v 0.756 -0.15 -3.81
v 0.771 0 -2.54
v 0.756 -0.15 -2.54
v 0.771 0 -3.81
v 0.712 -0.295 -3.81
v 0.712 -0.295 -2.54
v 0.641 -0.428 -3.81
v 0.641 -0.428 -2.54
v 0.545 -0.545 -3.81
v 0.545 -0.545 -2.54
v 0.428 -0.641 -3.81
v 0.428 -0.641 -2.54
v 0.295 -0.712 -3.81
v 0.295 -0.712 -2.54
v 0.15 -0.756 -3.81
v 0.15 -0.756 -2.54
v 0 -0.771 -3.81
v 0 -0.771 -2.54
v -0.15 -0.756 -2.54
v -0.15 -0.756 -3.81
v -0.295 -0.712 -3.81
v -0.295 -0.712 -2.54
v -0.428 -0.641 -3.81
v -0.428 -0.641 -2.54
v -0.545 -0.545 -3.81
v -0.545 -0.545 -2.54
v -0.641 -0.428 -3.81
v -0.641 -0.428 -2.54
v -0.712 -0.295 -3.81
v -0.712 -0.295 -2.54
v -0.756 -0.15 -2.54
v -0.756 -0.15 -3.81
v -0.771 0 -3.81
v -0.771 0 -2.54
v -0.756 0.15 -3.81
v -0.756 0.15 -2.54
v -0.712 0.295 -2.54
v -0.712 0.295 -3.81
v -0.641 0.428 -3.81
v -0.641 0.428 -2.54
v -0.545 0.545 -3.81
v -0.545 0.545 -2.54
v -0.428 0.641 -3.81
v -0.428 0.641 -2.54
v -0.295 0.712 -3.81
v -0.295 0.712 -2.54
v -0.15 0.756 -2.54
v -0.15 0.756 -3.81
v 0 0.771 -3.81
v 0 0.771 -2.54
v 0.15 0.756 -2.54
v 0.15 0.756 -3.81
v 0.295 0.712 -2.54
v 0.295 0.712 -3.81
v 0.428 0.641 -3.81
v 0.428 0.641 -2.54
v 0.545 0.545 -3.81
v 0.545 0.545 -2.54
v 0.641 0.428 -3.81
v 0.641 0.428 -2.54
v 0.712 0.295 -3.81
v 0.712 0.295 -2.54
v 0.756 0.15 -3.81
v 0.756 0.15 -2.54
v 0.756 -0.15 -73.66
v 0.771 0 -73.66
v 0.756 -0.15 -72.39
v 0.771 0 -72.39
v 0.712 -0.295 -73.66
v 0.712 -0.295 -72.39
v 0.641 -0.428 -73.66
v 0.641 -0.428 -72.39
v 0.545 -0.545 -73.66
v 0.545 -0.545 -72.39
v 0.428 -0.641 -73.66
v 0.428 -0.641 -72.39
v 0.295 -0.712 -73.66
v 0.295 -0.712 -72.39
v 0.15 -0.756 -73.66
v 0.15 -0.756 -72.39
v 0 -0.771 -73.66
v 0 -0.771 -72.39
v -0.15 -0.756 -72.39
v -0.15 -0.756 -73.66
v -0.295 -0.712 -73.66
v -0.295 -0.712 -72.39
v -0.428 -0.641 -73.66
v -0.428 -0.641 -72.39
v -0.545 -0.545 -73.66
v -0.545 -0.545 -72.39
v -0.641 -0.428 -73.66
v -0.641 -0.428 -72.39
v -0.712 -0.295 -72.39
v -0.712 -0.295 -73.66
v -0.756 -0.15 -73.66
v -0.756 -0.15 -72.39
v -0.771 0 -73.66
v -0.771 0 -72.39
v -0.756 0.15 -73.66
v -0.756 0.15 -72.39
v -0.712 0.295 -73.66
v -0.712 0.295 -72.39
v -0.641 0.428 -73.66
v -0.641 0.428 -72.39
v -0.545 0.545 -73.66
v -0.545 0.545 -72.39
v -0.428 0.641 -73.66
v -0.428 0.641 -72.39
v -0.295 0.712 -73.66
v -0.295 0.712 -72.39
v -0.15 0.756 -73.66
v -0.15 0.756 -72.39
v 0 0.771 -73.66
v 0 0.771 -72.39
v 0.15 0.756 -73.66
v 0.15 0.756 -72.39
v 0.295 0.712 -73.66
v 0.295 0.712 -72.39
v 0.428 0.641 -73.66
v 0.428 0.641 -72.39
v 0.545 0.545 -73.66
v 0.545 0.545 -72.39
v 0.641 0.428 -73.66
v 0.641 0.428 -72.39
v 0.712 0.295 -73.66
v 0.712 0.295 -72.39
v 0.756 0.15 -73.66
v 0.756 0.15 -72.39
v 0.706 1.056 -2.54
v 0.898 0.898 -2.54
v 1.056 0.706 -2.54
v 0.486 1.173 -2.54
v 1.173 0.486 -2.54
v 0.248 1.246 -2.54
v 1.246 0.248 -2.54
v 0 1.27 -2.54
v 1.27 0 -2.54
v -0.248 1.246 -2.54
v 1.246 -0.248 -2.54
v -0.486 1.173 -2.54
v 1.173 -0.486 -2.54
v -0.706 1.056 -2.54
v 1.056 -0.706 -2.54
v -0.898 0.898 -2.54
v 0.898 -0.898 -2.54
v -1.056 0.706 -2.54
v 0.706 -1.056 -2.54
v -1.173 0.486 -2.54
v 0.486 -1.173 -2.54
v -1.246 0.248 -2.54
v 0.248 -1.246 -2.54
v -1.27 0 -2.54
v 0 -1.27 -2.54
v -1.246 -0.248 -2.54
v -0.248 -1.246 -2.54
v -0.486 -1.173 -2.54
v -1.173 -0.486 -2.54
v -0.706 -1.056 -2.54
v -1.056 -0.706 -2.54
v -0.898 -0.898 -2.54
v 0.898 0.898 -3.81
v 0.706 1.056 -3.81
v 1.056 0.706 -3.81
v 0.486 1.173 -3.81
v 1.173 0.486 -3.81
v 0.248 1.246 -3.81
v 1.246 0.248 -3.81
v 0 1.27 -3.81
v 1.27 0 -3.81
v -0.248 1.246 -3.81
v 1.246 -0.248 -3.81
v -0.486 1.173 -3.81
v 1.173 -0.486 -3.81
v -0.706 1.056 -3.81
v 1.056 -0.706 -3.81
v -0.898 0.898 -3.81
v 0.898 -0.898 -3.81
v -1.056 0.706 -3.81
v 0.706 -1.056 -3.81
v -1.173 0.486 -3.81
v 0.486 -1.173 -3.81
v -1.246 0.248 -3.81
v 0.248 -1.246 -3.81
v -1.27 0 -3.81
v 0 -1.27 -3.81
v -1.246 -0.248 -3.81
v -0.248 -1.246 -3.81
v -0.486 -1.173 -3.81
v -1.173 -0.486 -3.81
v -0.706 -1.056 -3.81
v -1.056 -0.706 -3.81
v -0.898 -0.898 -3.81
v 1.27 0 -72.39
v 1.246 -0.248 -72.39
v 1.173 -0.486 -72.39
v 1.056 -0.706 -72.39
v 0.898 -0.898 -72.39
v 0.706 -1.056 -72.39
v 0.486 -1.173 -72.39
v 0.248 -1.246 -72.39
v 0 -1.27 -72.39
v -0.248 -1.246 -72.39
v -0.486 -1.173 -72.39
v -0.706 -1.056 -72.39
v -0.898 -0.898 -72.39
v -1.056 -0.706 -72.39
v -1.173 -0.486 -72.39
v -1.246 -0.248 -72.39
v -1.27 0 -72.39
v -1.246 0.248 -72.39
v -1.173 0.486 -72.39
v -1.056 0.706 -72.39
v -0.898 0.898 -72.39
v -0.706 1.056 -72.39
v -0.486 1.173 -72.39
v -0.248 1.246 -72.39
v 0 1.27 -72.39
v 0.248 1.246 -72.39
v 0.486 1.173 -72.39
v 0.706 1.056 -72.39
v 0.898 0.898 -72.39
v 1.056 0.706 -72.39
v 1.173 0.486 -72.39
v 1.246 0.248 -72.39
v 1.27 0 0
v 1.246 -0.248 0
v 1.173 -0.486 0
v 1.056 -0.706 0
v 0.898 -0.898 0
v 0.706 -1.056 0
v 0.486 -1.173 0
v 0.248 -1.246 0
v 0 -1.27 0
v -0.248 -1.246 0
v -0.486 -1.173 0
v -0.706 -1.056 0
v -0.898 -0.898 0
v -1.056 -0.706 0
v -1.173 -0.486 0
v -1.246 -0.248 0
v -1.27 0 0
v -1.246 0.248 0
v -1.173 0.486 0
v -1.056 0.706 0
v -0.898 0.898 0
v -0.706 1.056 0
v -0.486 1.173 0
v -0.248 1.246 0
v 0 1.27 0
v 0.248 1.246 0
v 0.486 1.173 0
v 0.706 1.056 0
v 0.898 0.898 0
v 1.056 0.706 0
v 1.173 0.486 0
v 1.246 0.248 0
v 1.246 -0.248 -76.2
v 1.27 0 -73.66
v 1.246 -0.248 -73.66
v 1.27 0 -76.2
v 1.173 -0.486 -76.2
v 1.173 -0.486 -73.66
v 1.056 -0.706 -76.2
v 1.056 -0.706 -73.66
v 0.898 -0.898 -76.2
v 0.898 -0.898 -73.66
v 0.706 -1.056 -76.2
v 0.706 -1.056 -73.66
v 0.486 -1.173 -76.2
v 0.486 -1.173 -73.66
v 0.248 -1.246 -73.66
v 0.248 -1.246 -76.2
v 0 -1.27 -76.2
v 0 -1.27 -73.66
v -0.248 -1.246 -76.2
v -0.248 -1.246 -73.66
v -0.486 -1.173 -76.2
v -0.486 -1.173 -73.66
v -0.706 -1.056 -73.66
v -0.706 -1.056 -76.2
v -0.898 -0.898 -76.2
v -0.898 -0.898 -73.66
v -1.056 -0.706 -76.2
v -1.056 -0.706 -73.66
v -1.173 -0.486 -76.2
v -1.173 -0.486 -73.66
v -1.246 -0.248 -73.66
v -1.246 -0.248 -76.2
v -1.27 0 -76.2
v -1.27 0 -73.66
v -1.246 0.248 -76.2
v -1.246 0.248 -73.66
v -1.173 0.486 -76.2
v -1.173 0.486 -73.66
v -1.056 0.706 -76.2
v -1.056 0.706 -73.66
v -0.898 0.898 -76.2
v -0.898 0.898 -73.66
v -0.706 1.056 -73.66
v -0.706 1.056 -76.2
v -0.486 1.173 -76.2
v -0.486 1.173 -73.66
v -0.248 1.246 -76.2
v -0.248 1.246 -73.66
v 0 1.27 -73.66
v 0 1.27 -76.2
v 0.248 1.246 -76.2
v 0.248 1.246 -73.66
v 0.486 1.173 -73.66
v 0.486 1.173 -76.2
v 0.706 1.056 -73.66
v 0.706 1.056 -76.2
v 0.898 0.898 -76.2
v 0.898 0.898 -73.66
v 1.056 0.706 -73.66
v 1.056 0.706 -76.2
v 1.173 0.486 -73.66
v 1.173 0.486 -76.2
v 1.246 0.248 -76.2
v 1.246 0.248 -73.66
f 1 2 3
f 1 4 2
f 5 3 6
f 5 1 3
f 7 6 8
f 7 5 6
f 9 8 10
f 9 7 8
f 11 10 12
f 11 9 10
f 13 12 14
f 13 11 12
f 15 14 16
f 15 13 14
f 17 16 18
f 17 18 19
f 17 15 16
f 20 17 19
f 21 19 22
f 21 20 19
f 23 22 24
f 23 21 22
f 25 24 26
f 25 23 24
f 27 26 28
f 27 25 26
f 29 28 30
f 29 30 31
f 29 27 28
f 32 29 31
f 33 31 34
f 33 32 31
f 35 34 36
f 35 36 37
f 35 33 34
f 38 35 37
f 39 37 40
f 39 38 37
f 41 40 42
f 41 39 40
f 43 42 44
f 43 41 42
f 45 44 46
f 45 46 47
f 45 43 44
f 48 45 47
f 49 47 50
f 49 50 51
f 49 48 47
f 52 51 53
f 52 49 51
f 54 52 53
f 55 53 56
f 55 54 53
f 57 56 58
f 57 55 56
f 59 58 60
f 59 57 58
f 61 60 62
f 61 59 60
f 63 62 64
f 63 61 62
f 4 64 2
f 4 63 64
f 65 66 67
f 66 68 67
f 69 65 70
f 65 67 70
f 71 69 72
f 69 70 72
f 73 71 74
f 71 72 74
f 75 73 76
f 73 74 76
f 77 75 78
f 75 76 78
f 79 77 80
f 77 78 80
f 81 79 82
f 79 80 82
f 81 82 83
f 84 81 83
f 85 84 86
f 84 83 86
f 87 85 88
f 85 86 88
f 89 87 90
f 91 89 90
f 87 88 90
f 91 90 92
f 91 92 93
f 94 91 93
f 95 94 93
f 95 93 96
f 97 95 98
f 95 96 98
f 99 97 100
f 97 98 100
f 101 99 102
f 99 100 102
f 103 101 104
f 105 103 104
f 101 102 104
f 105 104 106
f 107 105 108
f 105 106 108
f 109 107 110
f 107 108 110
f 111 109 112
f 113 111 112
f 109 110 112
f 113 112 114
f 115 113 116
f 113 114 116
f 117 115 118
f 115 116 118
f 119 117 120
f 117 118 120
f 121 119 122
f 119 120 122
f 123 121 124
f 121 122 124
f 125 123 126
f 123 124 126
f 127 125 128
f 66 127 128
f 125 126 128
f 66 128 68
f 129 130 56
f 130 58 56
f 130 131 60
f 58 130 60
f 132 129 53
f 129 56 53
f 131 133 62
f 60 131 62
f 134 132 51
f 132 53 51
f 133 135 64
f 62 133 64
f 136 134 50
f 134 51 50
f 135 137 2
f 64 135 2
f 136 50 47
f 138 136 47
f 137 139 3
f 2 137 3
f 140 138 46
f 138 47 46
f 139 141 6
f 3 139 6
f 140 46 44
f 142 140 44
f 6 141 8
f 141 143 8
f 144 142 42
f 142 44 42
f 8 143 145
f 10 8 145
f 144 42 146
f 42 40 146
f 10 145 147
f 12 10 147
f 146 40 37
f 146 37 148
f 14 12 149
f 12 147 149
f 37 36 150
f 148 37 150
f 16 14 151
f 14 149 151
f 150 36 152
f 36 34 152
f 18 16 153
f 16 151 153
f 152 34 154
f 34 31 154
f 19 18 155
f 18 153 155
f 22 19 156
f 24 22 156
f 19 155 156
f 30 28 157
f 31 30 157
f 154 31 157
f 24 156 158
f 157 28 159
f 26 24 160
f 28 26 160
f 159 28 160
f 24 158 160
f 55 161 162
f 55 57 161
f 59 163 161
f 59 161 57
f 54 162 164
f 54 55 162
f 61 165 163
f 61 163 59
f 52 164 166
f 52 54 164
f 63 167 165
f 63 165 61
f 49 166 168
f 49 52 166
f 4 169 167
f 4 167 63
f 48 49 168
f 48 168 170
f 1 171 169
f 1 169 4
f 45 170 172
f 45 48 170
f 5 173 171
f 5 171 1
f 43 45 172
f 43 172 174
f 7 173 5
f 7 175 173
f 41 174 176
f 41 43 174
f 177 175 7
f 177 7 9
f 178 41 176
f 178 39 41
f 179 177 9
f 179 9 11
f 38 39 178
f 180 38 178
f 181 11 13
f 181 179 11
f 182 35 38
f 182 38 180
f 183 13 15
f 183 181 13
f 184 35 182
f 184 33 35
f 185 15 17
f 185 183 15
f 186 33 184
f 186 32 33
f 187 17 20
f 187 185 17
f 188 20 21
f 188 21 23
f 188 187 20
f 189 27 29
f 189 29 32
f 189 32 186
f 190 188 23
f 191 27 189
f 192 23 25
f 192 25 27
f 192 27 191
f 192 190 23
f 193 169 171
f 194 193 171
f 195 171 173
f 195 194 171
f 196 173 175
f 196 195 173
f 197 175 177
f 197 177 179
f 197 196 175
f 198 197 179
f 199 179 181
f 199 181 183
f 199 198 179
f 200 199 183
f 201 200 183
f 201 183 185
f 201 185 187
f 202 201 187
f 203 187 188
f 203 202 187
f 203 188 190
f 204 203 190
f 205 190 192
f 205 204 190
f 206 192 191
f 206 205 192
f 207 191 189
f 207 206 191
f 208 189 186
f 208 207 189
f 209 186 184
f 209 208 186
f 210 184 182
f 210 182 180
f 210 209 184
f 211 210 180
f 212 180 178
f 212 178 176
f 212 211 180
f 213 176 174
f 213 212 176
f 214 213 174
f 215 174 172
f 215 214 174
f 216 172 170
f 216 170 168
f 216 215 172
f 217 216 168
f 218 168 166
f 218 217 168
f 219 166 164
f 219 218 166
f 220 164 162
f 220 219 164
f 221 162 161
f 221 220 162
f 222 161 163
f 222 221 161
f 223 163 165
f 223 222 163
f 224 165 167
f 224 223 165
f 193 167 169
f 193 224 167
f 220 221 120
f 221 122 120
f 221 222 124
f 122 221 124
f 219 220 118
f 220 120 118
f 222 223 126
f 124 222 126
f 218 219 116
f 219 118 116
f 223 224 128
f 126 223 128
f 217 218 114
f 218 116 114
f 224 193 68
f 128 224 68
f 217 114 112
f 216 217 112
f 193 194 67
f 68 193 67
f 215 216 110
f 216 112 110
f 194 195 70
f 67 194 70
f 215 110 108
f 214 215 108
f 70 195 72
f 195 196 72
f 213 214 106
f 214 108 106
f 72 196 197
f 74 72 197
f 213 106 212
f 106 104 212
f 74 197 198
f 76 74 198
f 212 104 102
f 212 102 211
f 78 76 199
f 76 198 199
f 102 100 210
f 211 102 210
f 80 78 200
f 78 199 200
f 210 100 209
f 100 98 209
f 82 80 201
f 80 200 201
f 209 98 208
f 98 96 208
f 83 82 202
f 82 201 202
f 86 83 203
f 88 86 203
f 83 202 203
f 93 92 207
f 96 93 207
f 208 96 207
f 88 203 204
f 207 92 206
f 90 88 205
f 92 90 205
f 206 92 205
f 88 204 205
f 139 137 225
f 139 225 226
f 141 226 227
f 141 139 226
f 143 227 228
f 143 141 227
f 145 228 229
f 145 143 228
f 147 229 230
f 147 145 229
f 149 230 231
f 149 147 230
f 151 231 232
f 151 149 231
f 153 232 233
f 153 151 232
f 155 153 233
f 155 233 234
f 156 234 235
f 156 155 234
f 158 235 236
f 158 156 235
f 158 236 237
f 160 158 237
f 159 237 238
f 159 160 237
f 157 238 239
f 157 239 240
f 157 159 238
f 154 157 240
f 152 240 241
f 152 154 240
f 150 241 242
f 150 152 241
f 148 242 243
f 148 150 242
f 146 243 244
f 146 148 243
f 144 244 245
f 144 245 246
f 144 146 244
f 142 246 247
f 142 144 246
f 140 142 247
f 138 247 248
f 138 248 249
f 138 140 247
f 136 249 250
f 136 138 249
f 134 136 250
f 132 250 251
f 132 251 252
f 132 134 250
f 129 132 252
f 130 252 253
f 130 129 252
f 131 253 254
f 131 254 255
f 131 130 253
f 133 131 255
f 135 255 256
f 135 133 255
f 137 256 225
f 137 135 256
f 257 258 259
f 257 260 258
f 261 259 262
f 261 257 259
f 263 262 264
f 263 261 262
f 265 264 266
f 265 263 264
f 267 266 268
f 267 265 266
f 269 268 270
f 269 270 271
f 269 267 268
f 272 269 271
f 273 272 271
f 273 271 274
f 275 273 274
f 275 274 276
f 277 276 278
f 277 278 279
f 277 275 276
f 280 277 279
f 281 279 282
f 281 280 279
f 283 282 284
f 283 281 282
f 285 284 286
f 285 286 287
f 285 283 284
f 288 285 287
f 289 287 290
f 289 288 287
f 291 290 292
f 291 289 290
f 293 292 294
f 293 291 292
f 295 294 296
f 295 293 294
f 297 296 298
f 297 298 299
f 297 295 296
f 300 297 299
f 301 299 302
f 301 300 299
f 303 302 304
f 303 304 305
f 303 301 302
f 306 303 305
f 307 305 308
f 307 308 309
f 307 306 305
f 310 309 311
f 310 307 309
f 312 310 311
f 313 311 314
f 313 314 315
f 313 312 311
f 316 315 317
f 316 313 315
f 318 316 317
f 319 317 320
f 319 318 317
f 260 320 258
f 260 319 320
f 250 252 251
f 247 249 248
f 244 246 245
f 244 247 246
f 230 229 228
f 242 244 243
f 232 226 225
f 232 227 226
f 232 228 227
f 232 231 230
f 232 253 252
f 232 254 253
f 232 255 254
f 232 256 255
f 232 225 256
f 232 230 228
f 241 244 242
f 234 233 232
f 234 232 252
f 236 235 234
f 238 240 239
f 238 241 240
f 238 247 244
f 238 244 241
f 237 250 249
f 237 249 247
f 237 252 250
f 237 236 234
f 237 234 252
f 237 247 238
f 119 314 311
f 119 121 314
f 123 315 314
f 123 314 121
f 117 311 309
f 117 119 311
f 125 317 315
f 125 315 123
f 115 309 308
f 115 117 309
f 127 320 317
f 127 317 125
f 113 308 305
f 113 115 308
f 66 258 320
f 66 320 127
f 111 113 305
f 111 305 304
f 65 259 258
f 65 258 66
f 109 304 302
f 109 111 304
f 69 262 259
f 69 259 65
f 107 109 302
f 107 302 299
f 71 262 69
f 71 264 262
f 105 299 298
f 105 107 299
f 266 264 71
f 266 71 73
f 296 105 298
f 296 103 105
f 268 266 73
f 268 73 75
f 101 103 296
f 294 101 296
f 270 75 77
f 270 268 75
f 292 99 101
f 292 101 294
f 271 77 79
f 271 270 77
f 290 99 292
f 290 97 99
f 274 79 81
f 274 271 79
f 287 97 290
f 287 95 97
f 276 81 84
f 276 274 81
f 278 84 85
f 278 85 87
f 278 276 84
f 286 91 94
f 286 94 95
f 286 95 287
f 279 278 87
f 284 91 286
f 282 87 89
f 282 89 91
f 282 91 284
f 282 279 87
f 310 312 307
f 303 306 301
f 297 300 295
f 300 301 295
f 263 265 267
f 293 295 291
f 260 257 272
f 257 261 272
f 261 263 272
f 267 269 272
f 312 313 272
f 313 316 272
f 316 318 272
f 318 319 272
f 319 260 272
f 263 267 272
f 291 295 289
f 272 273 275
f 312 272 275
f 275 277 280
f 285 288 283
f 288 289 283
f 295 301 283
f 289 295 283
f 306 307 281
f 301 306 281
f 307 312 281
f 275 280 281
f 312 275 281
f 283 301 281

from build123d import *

# Parameters (mm, degrees)
SKETCH2_W = 1.27
SKETCH2_H = 76.2
SKETCH3_W = 0.499412869
SKETCH3_H = 1.27


with BuildPart() as part:
    # Sketch2 → Revolve1 (revolve)
    with BuildSketch(Plane(origin=(0, 0, 0), x_dir=(1, 0, 0), z_dir=(0, 1, 0))):
        with Locations((0.635, 38.1)):
            Rectangle(SKETCH2_W, SKETCH2_H)
    revolve(axis=Axis((0, 0, 0), (0, 0, -1)))

    # Sketch3 → Cut-Revolve1 (revolve, cut)
    with BuildSketch(Plane(origin=(0, 0, 0), x_dir=(1, 0, 0), z_dir=(0, 1, 0))):
        with Locations((1.020293566, 3.175)):
            Rectangle(SKETCH3_W, SKETCH3_H)
    cut_revolve1 = revolve(axis=Axis((0, 0, 0), (0, 0, -1)), mode=Mode.SUBTRACT)

    # Mirror1: Cut-Revolve1 across plane
    add(cut_revolve1.mirror(Plane.XY.offset(-38.1)), mode=Mode.SUBTRACT)


solid = part.part
